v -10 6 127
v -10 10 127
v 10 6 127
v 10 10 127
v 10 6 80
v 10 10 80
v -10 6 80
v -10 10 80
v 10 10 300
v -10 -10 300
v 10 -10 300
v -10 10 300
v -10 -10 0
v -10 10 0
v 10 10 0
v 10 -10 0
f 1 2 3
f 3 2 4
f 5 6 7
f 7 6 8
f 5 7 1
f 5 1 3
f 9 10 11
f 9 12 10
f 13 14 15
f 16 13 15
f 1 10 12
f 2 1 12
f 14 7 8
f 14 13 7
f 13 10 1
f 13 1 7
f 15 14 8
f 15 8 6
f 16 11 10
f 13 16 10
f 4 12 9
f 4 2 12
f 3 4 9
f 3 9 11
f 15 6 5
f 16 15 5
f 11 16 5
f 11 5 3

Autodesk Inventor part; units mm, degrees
ref_plane "YZ Plane" through (0, 0, 0) normal (1, 0, 0) x (0, 1, 0)
ref_plane "XZ Plane" through (0, 0, 0) normal (0, 1, 0) x (-1, 0, 0)
ref_plane "XY Plane" through (0, 0, 0) normal (0, 0, 1) x (1, 0, 0)
sketch "Sketch1" plane through (0, 0, 0) normal (0, 0, 1) x (1, 0, 0)
  line L0 (-10, 10) -> (10, 10)
  line L1 (10, 10) -> (10, -10)
  line L2 (10, -10) -> (-10, -10)
  line L3 (-10, -10) -> (-10, 10)
  point P0 (0, 0)
  dimension "d0" = 20
  dimension "d1" = 20
  dimension "d2" = 10
  dimension "d3" = 10
extrude "Extrusion1" add sketch "Sketch1" along normal blind 300
sketch "Sketch2" plane through (-10, 10, 0) normal (0, 1, 0) x (1, 0, 0)
  line L0 (0, 0) -> (0, -300) projected
  line L1 (20, 0) -> (20, -300) projected
  line L2 (0, -127) -> (20, -127)
  line L3 (20, -127) -> (20, -80)
  line L4 (20, -80) -> (0, -80)
  line L5 (0, -80) -> (0, -127)
  line L6 (0, 0) -> (20, 0) projected
  point P0 (10, 0)
  dimension "d6" = 47
  dimension "d7" = 80
extrude "Extrusion2" cut sketch "Sketch2" against normal blind 4 contours L4 L1 L2 L0
equation "\"d2\" = 0.5 * d0"
equation "\"d3\" = 0.5 * d1"
properties part number "cnc power plug"
